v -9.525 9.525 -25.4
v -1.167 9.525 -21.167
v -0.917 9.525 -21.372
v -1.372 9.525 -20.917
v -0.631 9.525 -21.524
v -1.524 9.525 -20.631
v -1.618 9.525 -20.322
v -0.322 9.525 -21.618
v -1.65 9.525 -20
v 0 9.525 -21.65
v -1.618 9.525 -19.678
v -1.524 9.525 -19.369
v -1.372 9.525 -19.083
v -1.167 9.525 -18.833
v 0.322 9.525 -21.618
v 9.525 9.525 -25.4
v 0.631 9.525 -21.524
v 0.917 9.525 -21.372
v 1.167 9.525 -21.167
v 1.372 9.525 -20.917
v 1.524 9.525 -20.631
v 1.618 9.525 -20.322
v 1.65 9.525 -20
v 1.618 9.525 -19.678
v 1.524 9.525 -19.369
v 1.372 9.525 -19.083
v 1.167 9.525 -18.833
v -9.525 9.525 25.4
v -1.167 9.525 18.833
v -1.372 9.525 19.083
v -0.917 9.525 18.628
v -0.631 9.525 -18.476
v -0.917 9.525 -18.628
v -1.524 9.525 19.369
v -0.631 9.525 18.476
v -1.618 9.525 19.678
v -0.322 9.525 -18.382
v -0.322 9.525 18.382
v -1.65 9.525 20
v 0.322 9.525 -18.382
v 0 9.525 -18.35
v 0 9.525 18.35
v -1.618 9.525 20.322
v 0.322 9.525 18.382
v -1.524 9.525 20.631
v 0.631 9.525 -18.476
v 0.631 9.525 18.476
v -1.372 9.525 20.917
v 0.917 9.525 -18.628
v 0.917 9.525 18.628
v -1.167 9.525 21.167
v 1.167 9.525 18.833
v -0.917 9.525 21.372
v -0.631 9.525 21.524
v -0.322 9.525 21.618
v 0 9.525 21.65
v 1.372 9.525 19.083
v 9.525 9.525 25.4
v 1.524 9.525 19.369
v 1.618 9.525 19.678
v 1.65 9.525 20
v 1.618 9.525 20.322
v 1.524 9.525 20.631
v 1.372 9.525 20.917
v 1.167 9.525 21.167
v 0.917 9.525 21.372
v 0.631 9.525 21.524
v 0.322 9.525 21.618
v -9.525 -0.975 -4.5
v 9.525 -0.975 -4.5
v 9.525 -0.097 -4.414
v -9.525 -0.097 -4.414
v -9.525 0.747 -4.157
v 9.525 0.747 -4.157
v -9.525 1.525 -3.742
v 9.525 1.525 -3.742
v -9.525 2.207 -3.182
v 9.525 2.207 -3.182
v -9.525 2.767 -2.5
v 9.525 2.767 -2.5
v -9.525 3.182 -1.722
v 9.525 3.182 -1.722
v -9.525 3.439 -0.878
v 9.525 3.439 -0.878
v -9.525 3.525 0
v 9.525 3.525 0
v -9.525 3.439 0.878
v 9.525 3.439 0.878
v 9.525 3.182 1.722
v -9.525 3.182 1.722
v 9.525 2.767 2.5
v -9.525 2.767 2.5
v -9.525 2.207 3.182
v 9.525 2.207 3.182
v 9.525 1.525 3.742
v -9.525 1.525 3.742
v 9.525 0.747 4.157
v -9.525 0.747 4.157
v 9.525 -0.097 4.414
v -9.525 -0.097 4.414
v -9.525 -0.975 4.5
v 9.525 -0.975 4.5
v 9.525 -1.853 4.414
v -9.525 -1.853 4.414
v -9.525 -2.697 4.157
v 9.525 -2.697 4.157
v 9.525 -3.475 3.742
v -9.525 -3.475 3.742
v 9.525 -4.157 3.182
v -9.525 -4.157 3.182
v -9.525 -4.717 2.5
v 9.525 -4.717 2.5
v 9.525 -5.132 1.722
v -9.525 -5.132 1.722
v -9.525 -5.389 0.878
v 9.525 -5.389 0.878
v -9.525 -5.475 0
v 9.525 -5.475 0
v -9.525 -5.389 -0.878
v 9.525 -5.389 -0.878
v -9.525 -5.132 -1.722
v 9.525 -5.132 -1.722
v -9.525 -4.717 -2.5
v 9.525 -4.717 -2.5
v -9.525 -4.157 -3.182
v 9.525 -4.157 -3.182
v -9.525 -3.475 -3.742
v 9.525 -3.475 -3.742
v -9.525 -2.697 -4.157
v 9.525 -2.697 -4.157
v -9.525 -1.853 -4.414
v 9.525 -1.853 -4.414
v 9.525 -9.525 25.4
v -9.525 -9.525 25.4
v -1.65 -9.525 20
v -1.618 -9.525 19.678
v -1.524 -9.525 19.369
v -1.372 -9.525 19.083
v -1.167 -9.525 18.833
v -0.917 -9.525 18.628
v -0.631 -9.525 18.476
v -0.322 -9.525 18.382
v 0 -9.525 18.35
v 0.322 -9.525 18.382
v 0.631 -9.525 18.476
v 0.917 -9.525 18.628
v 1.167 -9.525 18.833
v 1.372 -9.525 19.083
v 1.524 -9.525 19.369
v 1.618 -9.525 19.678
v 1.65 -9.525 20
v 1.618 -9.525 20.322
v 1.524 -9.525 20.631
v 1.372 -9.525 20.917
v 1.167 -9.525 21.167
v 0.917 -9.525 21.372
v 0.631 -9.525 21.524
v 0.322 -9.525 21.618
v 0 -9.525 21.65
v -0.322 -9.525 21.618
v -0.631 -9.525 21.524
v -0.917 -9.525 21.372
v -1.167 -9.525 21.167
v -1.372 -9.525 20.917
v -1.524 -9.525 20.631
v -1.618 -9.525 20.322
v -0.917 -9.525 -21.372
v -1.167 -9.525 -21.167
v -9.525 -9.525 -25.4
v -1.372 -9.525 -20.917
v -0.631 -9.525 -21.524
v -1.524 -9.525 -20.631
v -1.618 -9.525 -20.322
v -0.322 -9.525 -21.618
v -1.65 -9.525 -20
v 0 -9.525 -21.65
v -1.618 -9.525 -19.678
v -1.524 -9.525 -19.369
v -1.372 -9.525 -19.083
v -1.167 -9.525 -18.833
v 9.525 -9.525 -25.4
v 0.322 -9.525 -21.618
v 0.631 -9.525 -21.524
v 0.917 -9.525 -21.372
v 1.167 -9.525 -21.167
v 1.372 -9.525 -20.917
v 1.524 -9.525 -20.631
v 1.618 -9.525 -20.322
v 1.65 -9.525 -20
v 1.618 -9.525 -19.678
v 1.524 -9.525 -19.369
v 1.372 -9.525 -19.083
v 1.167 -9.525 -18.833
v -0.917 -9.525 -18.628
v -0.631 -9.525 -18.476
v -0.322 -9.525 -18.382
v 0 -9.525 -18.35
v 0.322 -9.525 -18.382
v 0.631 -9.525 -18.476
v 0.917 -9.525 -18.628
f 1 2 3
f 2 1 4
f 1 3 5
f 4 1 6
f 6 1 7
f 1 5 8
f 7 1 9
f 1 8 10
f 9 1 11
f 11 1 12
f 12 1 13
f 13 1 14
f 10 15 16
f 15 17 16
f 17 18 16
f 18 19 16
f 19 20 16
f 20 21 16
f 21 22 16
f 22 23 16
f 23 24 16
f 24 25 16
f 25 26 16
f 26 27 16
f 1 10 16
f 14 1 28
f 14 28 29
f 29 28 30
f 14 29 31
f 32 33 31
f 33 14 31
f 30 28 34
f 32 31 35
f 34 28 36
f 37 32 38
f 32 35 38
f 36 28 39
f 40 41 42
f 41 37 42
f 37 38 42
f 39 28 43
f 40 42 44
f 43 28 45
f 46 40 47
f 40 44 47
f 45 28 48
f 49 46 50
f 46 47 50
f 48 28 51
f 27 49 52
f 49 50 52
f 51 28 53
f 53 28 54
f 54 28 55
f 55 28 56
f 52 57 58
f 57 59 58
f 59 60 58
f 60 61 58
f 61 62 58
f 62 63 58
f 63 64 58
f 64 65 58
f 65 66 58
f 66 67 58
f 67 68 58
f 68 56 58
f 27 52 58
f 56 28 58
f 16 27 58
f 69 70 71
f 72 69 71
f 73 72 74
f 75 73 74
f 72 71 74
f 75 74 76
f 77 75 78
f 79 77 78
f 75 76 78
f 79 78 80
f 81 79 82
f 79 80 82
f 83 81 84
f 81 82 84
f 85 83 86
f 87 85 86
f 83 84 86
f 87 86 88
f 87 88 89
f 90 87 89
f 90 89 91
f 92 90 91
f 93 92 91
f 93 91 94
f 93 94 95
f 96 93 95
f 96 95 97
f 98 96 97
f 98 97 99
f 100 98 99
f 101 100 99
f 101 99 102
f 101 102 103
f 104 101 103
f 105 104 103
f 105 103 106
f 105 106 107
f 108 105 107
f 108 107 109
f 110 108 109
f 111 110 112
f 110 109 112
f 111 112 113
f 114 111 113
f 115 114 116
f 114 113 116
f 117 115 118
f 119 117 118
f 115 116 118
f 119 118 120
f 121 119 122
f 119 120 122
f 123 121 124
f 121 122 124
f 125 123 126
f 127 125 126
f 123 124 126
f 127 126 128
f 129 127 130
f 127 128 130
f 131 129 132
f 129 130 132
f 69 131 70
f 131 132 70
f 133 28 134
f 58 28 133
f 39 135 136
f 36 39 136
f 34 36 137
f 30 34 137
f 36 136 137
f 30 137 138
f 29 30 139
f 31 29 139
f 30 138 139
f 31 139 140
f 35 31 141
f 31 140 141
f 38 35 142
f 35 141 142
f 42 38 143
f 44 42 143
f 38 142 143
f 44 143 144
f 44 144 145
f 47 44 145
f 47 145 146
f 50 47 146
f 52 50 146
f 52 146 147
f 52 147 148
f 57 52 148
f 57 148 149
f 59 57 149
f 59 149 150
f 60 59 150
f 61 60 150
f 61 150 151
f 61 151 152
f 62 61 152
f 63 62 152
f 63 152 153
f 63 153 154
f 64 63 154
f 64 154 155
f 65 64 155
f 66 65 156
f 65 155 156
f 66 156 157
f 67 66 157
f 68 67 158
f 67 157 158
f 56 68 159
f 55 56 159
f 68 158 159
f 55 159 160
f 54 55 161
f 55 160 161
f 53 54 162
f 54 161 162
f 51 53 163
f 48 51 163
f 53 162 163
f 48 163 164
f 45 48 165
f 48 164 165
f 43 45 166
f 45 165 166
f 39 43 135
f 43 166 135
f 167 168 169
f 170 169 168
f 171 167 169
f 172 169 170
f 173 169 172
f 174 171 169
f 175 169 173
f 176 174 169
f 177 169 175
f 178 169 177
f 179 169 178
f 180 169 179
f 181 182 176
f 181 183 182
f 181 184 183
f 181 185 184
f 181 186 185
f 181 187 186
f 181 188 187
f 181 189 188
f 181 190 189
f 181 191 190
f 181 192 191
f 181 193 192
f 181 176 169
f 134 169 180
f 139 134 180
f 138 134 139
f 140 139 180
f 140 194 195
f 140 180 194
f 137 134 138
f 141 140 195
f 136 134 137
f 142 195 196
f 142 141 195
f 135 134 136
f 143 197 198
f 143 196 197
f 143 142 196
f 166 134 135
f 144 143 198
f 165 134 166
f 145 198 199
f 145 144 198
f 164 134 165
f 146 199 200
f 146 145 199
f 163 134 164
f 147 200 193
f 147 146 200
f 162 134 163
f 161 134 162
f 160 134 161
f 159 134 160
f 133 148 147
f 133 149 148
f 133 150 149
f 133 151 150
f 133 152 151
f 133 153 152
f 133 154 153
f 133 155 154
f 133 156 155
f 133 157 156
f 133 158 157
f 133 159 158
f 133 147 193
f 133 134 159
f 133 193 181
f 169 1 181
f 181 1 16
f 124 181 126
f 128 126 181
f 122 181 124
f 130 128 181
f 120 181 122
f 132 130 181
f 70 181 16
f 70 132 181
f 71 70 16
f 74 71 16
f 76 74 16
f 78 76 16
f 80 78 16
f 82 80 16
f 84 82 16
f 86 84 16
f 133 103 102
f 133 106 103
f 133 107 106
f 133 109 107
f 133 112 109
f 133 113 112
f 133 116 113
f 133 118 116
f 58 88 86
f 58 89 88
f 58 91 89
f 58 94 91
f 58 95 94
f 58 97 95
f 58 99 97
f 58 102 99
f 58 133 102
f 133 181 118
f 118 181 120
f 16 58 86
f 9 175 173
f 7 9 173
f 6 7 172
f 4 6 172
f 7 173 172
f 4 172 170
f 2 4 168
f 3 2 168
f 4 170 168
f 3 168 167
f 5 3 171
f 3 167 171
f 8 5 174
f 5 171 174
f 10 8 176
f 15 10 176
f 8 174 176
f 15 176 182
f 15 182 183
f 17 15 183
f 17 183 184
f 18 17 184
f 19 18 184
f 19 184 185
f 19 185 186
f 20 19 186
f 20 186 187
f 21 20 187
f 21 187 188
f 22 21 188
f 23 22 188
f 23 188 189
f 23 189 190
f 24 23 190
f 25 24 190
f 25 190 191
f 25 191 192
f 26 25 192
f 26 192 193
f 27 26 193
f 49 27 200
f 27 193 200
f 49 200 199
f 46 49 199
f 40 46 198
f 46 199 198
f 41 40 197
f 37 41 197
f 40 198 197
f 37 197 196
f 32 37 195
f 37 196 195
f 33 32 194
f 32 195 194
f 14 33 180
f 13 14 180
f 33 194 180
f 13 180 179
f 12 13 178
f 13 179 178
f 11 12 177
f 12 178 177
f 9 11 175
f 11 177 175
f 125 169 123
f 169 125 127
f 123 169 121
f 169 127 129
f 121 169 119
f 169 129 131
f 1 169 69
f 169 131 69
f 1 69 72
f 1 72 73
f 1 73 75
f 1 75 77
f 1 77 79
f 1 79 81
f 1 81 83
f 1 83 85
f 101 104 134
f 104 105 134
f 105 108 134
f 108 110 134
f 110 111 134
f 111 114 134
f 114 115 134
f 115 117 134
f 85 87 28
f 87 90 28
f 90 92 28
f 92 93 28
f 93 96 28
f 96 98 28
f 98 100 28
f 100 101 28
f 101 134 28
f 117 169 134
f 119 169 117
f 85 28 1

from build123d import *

# Parameters (mm, degrees)
SKETCH1_W                   = 19.05
SKETCH1_H                   = 19.05
BOSS_EXTRUDE1_DEPTH         = 25.4
TAP_DRILL_FOR_M4X0_7_TAP1_D = 3.3
M8_CLEARANCE_HOLE1_D        = 9


with BuildPart() as part:
    # Sketch1 → Boss-Extrude1 (new, symmetric)
    with BuildSketch(Plane.XY):
        Rectangle(SKETCH1_W, SKETCH1_H)
    extrude(amount=BOSS_EXTRUDE1_DEPTH, both=True)

    # Tap Drill for M4x0.7 Tap1 (through all)
    with Locations(Plane(origin=(0, 9.525, 0), x_dir=(1, 0, 0), z_dir=(0, 1, 0))):
        with Locations((0, 20), (0, -20)):
            Hole(TAP_DRILL_FOR_M4X0_7_TAP1_D / 2)

    # M8 Clearance Hole1 (through all)
    with Locations(Plane.ZY.offset(9.525)):
        with Locations((0, -0.975)):
            Hole(M8_CLEARANCE_HOLE1_D / 2)


solid = part.part
